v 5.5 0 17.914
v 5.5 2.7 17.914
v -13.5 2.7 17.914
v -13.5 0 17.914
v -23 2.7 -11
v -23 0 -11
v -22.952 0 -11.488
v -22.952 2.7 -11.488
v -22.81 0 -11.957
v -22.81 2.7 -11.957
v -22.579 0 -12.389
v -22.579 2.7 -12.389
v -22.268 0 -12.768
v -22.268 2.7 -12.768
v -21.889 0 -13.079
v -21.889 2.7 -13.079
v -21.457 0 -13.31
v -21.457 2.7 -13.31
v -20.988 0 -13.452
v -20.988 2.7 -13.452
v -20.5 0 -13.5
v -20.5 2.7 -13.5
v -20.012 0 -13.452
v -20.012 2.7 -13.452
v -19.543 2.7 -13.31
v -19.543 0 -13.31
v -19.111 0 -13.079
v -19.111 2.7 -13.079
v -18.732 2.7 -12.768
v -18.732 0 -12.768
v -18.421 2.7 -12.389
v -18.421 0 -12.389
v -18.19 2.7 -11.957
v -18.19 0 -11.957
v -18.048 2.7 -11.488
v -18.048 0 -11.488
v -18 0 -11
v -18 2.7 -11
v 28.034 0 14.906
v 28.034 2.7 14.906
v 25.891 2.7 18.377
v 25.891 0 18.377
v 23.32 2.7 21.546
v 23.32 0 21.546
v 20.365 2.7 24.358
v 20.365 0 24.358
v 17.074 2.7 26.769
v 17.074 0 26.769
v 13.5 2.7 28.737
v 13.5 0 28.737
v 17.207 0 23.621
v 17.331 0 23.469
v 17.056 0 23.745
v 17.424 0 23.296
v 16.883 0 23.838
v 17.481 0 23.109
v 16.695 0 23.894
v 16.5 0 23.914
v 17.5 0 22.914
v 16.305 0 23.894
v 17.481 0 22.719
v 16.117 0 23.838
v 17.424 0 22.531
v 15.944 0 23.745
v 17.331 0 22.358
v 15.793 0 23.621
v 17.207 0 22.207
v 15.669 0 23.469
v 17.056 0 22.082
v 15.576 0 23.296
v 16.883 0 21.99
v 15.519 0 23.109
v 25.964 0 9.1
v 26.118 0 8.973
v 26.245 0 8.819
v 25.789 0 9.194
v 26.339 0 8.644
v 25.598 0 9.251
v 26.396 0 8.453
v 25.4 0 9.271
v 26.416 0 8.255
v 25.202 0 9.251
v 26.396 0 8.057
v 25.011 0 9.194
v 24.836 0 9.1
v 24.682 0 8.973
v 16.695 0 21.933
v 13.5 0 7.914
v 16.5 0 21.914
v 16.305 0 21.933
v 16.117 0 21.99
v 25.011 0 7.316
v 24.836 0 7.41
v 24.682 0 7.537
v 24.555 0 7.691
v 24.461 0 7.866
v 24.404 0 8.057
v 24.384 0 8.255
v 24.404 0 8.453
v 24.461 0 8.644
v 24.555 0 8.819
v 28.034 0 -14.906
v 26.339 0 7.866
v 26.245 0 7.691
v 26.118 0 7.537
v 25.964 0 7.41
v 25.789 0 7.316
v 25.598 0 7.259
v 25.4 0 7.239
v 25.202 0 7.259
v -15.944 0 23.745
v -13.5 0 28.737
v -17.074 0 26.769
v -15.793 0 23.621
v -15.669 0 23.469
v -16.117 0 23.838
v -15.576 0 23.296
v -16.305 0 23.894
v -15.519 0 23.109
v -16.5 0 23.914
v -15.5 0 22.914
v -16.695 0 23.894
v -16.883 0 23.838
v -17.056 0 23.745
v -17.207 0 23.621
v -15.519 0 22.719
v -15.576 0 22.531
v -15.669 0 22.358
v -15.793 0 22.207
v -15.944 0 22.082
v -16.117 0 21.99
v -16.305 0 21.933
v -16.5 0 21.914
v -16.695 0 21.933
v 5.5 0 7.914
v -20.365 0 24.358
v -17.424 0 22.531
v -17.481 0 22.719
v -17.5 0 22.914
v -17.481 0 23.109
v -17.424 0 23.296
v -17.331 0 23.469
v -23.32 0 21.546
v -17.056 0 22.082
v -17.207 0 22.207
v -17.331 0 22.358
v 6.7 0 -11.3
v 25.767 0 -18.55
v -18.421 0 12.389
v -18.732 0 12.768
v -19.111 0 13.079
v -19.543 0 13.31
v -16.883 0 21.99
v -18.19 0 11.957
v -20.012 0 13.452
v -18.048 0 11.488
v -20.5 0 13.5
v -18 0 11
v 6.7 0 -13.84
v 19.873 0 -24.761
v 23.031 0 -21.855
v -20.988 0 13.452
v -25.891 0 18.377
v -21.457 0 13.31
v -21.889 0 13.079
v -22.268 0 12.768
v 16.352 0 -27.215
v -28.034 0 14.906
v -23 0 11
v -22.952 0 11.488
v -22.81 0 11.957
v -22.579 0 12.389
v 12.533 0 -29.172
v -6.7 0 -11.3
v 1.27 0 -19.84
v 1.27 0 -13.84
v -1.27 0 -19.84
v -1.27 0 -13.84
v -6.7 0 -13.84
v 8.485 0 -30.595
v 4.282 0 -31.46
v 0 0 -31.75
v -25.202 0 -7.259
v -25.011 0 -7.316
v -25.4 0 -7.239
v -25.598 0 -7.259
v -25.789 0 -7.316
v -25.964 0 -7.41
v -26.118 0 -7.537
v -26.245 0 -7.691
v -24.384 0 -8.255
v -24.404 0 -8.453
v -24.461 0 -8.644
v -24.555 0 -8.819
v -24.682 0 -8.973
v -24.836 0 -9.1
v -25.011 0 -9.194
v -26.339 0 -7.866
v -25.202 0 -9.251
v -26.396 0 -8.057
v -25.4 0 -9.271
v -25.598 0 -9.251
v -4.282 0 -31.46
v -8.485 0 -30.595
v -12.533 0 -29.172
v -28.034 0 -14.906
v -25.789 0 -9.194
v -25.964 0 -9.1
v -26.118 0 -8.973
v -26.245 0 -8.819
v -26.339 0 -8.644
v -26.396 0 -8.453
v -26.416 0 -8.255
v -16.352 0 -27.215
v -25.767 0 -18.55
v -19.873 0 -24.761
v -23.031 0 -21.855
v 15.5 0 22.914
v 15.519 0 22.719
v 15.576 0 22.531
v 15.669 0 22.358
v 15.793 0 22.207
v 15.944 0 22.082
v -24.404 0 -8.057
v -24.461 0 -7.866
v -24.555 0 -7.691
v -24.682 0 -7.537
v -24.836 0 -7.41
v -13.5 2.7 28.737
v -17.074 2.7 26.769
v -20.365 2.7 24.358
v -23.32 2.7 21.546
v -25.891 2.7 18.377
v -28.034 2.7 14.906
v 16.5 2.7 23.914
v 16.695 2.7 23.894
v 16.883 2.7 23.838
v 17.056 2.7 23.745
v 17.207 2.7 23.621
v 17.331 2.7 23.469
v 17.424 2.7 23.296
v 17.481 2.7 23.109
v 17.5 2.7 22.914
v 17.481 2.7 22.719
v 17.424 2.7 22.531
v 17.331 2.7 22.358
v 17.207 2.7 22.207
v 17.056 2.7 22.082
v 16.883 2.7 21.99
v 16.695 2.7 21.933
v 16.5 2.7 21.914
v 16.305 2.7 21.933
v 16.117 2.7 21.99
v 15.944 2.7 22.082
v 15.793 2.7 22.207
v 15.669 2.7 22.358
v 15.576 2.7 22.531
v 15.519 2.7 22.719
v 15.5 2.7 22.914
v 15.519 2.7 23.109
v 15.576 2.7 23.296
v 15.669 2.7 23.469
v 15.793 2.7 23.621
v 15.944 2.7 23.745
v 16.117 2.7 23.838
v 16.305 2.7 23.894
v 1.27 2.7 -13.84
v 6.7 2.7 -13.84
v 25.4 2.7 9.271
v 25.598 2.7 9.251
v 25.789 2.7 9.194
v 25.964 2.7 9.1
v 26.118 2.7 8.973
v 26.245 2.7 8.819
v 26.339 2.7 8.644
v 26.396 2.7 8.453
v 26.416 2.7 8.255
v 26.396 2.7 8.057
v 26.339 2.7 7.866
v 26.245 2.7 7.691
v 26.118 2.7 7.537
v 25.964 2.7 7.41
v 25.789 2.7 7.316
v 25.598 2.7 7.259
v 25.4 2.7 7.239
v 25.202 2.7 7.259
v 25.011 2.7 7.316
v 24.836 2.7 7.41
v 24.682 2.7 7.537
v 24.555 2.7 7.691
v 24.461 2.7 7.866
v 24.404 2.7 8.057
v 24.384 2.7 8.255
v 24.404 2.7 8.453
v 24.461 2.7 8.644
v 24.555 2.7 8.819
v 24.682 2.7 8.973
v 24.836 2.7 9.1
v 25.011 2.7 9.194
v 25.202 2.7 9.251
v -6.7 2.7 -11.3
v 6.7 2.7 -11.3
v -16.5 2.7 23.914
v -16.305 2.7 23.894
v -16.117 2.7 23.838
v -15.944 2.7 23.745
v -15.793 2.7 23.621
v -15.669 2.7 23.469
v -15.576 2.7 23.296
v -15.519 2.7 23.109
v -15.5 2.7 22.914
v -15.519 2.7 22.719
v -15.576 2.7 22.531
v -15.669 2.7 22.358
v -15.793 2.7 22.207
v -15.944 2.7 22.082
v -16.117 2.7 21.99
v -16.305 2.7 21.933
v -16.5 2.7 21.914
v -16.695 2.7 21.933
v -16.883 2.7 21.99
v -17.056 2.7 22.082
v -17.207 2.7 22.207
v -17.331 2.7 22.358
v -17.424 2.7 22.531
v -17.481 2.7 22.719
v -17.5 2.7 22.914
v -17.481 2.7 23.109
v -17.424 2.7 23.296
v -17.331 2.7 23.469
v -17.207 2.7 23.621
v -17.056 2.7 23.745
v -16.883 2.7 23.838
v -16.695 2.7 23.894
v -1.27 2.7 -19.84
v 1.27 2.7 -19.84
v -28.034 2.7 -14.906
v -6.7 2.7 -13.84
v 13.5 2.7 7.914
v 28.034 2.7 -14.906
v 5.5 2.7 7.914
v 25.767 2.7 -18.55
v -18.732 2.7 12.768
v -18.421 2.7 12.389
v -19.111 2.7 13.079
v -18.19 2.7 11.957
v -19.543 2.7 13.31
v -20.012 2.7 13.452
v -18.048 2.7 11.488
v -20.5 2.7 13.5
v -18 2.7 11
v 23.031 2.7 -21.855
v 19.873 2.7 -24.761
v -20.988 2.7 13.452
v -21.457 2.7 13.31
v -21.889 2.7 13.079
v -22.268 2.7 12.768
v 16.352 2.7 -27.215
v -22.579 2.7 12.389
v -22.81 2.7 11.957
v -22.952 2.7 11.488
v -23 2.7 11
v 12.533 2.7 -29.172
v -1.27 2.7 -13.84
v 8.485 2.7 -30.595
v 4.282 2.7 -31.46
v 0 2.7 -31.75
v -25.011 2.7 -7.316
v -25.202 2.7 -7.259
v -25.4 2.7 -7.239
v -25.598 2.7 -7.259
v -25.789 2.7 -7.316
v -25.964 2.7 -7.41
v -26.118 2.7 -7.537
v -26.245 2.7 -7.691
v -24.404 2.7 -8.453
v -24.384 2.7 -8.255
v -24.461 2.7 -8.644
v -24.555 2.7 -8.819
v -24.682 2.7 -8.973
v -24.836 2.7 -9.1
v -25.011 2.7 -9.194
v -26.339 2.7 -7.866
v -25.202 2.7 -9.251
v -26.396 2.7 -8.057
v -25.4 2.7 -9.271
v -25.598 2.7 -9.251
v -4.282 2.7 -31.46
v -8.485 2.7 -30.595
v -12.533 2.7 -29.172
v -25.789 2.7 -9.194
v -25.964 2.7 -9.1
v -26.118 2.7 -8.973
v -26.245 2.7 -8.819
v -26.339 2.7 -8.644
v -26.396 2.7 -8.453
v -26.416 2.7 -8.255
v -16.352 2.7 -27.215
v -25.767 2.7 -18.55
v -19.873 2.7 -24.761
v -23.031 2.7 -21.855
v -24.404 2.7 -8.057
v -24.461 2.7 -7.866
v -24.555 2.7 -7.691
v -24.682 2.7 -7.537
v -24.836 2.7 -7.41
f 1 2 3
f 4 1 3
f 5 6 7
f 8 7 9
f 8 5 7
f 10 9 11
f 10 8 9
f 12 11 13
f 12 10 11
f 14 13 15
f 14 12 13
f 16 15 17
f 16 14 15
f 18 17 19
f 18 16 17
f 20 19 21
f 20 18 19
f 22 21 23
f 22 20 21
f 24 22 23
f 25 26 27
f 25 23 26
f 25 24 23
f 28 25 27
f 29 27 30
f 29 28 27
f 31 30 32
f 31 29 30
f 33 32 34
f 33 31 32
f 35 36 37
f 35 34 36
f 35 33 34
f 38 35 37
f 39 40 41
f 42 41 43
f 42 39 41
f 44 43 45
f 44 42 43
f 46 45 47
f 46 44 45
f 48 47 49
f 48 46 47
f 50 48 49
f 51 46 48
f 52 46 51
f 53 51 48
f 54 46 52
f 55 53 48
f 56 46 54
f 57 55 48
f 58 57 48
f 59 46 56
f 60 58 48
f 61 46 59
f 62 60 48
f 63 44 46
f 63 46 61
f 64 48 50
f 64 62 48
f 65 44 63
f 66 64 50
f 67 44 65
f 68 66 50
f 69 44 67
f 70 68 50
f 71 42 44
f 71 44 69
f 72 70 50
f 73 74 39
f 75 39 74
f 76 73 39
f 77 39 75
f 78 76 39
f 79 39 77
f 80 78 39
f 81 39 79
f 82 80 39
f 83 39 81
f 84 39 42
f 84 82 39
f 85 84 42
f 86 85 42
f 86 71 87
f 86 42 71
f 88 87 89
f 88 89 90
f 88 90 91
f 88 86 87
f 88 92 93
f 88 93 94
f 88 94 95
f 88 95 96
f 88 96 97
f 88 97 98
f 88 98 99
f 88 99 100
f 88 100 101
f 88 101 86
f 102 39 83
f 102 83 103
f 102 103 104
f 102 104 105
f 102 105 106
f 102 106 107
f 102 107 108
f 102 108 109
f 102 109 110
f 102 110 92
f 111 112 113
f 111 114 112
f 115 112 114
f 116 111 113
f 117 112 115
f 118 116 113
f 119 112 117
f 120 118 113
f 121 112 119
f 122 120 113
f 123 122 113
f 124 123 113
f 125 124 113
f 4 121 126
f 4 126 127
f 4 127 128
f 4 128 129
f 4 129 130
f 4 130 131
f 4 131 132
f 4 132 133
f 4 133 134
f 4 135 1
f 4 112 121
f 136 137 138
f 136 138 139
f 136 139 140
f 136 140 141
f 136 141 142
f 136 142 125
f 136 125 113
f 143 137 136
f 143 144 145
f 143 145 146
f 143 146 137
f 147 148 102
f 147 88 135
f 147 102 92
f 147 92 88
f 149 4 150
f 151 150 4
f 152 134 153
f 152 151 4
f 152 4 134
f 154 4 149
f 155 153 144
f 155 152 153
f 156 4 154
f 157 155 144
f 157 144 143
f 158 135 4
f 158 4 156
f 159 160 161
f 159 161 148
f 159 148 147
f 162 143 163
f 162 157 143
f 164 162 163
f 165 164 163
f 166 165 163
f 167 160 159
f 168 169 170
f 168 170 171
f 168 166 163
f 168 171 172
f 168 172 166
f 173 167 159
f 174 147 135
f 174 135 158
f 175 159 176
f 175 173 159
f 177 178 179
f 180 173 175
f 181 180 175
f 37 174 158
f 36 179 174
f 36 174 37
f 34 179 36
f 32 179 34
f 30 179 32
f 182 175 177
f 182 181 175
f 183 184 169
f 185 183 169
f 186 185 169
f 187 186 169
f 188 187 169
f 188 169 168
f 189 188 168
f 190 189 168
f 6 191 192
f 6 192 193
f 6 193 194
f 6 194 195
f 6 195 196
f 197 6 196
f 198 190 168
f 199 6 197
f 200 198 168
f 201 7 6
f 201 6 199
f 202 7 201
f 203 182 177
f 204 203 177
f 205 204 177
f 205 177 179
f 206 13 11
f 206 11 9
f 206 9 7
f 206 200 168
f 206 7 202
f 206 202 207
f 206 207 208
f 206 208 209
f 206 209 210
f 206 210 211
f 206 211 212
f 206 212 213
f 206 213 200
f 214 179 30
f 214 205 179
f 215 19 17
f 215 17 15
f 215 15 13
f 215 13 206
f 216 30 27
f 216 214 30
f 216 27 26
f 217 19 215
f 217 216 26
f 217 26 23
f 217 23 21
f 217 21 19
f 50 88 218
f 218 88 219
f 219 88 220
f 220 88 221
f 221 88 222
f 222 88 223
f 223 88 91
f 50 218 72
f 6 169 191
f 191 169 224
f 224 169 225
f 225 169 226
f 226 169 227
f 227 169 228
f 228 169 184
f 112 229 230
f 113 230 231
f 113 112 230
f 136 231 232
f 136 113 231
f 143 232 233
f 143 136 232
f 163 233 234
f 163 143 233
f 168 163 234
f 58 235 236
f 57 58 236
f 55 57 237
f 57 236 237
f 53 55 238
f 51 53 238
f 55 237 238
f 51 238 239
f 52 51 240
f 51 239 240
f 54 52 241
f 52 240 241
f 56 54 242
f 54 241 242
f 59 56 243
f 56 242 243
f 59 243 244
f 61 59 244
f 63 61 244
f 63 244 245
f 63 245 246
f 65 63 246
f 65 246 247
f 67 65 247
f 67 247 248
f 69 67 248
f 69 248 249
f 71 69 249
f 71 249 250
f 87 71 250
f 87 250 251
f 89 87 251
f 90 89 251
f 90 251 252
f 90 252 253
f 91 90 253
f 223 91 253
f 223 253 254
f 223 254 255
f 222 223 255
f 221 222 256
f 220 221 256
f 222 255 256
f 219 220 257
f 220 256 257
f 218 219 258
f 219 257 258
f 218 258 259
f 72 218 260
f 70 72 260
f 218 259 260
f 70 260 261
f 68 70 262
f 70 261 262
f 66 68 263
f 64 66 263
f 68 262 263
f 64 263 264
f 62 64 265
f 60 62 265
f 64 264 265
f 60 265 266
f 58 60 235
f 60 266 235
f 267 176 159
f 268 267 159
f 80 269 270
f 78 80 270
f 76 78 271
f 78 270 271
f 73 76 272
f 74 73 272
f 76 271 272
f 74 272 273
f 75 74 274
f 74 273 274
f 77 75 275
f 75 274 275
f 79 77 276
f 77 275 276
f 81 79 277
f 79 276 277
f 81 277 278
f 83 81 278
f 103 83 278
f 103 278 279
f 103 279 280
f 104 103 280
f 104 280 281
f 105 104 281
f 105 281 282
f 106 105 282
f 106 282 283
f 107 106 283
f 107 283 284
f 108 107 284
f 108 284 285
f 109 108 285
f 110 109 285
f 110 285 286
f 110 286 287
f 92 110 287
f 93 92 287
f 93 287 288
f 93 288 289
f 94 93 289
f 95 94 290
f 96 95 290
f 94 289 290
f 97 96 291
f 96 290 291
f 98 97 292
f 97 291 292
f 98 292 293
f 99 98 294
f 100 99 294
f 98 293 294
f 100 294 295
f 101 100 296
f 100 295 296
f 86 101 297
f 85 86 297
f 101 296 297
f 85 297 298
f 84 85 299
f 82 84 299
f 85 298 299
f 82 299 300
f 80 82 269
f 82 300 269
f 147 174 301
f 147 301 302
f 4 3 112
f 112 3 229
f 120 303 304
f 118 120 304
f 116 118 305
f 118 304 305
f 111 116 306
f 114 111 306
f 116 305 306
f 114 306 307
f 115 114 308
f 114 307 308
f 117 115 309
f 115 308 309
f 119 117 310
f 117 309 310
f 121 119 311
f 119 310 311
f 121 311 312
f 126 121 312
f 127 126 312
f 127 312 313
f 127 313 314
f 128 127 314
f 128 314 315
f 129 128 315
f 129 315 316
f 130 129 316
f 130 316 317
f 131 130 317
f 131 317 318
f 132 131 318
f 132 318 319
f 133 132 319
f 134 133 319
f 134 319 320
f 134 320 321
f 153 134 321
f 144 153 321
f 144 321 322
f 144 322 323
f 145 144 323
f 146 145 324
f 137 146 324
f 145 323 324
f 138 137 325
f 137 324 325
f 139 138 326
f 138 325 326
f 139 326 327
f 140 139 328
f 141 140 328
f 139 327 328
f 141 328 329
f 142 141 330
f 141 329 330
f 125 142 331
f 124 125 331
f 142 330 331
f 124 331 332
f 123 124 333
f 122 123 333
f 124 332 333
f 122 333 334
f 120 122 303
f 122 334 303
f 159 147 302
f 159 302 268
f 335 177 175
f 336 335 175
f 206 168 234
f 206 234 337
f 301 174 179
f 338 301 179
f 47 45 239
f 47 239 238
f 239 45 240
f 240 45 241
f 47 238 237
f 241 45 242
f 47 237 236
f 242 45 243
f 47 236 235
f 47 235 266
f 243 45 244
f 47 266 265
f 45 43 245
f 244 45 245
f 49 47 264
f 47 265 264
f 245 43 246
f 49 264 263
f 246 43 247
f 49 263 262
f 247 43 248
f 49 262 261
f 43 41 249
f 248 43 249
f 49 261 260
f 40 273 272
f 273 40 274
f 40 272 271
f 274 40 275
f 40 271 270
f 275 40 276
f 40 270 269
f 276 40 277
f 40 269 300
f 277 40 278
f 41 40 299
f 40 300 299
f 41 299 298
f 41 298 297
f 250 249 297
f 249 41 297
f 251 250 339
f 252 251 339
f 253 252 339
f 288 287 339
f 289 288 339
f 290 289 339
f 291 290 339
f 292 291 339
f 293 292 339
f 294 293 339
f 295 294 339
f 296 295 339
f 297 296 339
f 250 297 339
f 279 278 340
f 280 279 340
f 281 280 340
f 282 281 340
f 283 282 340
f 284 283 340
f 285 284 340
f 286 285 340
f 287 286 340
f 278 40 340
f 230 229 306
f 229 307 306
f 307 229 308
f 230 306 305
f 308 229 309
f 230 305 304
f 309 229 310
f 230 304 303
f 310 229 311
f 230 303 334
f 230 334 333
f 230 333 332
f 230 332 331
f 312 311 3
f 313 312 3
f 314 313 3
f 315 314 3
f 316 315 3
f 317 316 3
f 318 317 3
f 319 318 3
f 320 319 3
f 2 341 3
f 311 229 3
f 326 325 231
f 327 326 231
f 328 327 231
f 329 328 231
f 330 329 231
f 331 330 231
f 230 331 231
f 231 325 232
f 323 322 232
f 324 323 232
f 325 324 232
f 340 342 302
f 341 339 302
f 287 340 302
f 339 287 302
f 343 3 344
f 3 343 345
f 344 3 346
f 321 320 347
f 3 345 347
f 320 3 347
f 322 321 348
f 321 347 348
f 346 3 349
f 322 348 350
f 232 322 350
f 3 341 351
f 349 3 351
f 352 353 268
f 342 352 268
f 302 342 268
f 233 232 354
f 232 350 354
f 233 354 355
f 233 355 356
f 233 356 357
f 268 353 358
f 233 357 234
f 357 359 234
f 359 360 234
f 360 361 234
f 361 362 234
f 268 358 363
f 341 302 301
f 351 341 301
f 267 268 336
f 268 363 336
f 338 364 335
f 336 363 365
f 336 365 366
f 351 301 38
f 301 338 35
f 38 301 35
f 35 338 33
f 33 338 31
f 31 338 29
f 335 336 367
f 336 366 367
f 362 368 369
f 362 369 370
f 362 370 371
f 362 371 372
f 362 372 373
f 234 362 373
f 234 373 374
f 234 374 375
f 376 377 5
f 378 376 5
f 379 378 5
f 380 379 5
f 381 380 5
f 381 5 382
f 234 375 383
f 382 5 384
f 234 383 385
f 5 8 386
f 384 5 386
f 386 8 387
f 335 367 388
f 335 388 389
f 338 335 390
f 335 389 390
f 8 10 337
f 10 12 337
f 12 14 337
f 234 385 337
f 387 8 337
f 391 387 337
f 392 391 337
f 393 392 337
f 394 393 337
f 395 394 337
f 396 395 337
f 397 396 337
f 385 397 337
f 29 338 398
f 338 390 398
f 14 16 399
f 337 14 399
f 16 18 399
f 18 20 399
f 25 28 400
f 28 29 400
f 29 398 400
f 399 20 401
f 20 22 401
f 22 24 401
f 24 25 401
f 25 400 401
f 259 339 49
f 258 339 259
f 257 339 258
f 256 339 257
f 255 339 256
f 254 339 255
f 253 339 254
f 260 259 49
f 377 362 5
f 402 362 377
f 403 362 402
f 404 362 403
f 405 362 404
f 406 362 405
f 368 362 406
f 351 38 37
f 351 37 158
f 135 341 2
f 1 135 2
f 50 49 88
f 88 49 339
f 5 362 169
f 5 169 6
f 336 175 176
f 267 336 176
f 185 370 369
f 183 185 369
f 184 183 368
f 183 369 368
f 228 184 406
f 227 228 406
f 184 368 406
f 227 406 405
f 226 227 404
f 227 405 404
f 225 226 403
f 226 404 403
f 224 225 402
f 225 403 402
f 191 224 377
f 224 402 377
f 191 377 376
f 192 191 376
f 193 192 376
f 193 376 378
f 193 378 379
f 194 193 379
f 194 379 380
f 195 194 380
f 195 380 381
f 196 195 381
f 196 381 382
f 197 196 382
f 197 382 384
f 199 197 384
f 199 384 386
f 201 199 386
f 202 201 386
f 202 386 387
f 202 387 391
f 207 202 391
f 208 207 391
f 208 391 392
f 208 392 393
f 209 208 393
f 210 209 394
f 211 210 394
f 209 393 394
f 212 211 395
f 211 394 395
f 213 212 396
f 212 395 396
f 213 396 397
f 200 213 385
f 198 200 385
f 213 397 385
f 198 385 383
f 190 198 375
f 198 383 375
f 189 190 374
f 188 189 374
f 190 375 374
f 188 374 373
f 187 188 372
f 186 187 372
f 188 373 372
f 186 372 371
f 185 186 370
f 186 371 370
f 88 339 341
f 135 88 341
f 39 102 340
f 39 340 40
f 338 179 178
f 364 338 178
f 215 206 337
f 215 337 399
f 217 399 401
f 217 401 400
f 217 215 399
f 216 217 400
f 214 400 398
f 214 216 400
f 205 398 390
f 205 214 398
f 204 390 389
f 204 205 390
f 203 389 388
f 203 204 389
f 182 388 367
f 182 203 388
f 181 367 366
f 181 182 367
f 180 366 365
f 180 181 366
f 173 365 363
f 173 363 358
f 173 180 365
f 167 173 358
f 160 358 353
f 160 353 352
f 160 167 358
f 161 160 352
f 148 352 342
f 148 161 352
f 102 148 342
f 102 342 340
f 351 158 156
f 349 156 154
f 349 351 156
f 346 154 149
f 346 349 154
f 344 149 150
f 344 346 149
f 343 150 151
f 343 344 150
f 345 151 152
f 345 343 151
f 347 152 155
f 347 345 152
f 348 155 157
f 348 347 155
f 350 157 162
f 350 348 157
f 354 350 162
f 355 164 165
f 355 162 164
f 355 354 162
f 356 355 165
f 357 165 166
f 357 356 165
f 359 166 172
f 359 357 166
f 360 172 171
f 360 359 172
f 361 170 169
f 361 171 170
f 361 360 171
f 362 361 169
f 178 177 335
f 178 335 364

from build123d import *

# Parameters (mm, degrees)
SKETCH1_W          = 13.4
SKETCH1_H          = 2.54
BASE_DEPTH         = 2.7
WHEEL_HOLE_REACH   = 44.441
SKETCH9_R          = 1.016
CHIP_HOLDING_DEPTH = 43.440952488
NUB_SLOT_REACH     = 44.441
SKETCH10_W         = 2.54
SKETCH10_H         = 6
SKETCH11_R         = 1
CUT_EXTRUDE1_DEPTH = 10


with BuildPart() as part:
    # Sketch1 → Base (new body)
    with BuildSketch(Plane(origin=(0, 0, 0), x_dir=(1, 0, 0), z_dir=(0, 1, 0))):
        with BuildLine():
            Line((28.033586073, 14.905722118), (28.033586073, -14.905722118))
            ThreePointArc((28.033586073, -14.905722118), (0, -31.75), (-28.033586073, -14.905722118))
            Line((-28.033586073, -14.905722118), (-28.033586073, 14.905722118))
            ThreePointArc((-28.033586073, 14.905722118), (0, 31.75), (28.033586073, 14.905722118))
        make_face()
        with Locations((0, 12.57)):
            Rectangle(SKETCH1_W, SKETCH1_H, mode=Mode.SUBTRACT)
    extrude(amount=BASE_DEPTH)

    # Sketch2 → Wheel Hole (cut, up to next)
    with BuildSketch(Plane(origin=(0, 2.7, 0), x_dir=(-1, 0, 0), z_dir=(0, 1, 0)), mode=Mode.PRIVATE) as wheel_hole_sk1:
        with BuildLine():
            Line((18, -11), (18, 11))
            ThreePointArc((18, 11), (20.5, 13.5), (23, 11))
            Line((23, 11), (23, -11))
            ThreePointArc((23, -11), (20.5, -13.5), (18, -11))
        make_face()
    wheel_hole_tool1 = extrude(wheel_hole_sk1.sketch, amount=-WHEEL_HOLE_REACH, mode=Mode.PRIVATE) & part.part
    add(wheel_hole_tool1.solids().sort_by_distance((-20.5, 2.7, 0))[0], mode=Mode.SUBTRACT)

    # Sketch9 → Chip Holding (cut, through all)
    with BuildSketch(Plane(origin=(0, 2.7, 0), x_dir=(-1, 0, 0), z_dir=(0, 1, 0))):
        with Locations(Location((25.4, -8.255, 0), (0, 0, 90))):
            Circle(SKETCH9_R)
        with Locations(Location((-25.4, 8.255, 0), (0, 0, 90))):
            Circle(SKETCH9_R)
    extrude(amount=-CHIP_HOLDING_DEPTH, mode=Mode.SUBTRACT)

    # Sketch10 → Nub Slot (cut, up to next)
    with BuildSketch(Plane.XZ, mode=Mode.PRIVATE) as nub_slot_sk1:
        with Locations((0, -16.84)):
            Rectangle(SKETCH10_W, SKETCH10_H)
    nub_slot_tool1 = extrude(nub_slot_sk1.sketch, amount=-NUB_SLOT_REACH, mode=Mode.PRIVATE) & part.part
    add(nub_slot_tool1.solids().sort_by_distance((0, 0, -16.84))[0], mode=Mode.SUBTRACT)

    # Sketch11 → Cut-Extrude1 (cut)
    with BuildSketch(Plane(origin=(0, 2.7, 0), x_dir=(1, 0, 0), z_dir=(0, 1, 0))):
        with Locations(Location((16.5, -22.91366528, 0), (0, 0, 270))):
            Circle(SKETCH11_R)
        with Locations(Location((-16.5, -22.91366528, 0), (0, 0, 270))):
            Circle(SKETCH11_R)
        Polygon((-13.5, -31.75), (13.5, -31.75), (13.5, -17.91366528), (13.5, -7.91366528), (5.5, -7.91366528), (5.5, -17.91366528), (-13.5, -17.91366528), align=None)
    extrude(amount=-CUT_EXTRUDE1_DEPTH, mode=Mode.SUBTRACT)


solid = part.part
